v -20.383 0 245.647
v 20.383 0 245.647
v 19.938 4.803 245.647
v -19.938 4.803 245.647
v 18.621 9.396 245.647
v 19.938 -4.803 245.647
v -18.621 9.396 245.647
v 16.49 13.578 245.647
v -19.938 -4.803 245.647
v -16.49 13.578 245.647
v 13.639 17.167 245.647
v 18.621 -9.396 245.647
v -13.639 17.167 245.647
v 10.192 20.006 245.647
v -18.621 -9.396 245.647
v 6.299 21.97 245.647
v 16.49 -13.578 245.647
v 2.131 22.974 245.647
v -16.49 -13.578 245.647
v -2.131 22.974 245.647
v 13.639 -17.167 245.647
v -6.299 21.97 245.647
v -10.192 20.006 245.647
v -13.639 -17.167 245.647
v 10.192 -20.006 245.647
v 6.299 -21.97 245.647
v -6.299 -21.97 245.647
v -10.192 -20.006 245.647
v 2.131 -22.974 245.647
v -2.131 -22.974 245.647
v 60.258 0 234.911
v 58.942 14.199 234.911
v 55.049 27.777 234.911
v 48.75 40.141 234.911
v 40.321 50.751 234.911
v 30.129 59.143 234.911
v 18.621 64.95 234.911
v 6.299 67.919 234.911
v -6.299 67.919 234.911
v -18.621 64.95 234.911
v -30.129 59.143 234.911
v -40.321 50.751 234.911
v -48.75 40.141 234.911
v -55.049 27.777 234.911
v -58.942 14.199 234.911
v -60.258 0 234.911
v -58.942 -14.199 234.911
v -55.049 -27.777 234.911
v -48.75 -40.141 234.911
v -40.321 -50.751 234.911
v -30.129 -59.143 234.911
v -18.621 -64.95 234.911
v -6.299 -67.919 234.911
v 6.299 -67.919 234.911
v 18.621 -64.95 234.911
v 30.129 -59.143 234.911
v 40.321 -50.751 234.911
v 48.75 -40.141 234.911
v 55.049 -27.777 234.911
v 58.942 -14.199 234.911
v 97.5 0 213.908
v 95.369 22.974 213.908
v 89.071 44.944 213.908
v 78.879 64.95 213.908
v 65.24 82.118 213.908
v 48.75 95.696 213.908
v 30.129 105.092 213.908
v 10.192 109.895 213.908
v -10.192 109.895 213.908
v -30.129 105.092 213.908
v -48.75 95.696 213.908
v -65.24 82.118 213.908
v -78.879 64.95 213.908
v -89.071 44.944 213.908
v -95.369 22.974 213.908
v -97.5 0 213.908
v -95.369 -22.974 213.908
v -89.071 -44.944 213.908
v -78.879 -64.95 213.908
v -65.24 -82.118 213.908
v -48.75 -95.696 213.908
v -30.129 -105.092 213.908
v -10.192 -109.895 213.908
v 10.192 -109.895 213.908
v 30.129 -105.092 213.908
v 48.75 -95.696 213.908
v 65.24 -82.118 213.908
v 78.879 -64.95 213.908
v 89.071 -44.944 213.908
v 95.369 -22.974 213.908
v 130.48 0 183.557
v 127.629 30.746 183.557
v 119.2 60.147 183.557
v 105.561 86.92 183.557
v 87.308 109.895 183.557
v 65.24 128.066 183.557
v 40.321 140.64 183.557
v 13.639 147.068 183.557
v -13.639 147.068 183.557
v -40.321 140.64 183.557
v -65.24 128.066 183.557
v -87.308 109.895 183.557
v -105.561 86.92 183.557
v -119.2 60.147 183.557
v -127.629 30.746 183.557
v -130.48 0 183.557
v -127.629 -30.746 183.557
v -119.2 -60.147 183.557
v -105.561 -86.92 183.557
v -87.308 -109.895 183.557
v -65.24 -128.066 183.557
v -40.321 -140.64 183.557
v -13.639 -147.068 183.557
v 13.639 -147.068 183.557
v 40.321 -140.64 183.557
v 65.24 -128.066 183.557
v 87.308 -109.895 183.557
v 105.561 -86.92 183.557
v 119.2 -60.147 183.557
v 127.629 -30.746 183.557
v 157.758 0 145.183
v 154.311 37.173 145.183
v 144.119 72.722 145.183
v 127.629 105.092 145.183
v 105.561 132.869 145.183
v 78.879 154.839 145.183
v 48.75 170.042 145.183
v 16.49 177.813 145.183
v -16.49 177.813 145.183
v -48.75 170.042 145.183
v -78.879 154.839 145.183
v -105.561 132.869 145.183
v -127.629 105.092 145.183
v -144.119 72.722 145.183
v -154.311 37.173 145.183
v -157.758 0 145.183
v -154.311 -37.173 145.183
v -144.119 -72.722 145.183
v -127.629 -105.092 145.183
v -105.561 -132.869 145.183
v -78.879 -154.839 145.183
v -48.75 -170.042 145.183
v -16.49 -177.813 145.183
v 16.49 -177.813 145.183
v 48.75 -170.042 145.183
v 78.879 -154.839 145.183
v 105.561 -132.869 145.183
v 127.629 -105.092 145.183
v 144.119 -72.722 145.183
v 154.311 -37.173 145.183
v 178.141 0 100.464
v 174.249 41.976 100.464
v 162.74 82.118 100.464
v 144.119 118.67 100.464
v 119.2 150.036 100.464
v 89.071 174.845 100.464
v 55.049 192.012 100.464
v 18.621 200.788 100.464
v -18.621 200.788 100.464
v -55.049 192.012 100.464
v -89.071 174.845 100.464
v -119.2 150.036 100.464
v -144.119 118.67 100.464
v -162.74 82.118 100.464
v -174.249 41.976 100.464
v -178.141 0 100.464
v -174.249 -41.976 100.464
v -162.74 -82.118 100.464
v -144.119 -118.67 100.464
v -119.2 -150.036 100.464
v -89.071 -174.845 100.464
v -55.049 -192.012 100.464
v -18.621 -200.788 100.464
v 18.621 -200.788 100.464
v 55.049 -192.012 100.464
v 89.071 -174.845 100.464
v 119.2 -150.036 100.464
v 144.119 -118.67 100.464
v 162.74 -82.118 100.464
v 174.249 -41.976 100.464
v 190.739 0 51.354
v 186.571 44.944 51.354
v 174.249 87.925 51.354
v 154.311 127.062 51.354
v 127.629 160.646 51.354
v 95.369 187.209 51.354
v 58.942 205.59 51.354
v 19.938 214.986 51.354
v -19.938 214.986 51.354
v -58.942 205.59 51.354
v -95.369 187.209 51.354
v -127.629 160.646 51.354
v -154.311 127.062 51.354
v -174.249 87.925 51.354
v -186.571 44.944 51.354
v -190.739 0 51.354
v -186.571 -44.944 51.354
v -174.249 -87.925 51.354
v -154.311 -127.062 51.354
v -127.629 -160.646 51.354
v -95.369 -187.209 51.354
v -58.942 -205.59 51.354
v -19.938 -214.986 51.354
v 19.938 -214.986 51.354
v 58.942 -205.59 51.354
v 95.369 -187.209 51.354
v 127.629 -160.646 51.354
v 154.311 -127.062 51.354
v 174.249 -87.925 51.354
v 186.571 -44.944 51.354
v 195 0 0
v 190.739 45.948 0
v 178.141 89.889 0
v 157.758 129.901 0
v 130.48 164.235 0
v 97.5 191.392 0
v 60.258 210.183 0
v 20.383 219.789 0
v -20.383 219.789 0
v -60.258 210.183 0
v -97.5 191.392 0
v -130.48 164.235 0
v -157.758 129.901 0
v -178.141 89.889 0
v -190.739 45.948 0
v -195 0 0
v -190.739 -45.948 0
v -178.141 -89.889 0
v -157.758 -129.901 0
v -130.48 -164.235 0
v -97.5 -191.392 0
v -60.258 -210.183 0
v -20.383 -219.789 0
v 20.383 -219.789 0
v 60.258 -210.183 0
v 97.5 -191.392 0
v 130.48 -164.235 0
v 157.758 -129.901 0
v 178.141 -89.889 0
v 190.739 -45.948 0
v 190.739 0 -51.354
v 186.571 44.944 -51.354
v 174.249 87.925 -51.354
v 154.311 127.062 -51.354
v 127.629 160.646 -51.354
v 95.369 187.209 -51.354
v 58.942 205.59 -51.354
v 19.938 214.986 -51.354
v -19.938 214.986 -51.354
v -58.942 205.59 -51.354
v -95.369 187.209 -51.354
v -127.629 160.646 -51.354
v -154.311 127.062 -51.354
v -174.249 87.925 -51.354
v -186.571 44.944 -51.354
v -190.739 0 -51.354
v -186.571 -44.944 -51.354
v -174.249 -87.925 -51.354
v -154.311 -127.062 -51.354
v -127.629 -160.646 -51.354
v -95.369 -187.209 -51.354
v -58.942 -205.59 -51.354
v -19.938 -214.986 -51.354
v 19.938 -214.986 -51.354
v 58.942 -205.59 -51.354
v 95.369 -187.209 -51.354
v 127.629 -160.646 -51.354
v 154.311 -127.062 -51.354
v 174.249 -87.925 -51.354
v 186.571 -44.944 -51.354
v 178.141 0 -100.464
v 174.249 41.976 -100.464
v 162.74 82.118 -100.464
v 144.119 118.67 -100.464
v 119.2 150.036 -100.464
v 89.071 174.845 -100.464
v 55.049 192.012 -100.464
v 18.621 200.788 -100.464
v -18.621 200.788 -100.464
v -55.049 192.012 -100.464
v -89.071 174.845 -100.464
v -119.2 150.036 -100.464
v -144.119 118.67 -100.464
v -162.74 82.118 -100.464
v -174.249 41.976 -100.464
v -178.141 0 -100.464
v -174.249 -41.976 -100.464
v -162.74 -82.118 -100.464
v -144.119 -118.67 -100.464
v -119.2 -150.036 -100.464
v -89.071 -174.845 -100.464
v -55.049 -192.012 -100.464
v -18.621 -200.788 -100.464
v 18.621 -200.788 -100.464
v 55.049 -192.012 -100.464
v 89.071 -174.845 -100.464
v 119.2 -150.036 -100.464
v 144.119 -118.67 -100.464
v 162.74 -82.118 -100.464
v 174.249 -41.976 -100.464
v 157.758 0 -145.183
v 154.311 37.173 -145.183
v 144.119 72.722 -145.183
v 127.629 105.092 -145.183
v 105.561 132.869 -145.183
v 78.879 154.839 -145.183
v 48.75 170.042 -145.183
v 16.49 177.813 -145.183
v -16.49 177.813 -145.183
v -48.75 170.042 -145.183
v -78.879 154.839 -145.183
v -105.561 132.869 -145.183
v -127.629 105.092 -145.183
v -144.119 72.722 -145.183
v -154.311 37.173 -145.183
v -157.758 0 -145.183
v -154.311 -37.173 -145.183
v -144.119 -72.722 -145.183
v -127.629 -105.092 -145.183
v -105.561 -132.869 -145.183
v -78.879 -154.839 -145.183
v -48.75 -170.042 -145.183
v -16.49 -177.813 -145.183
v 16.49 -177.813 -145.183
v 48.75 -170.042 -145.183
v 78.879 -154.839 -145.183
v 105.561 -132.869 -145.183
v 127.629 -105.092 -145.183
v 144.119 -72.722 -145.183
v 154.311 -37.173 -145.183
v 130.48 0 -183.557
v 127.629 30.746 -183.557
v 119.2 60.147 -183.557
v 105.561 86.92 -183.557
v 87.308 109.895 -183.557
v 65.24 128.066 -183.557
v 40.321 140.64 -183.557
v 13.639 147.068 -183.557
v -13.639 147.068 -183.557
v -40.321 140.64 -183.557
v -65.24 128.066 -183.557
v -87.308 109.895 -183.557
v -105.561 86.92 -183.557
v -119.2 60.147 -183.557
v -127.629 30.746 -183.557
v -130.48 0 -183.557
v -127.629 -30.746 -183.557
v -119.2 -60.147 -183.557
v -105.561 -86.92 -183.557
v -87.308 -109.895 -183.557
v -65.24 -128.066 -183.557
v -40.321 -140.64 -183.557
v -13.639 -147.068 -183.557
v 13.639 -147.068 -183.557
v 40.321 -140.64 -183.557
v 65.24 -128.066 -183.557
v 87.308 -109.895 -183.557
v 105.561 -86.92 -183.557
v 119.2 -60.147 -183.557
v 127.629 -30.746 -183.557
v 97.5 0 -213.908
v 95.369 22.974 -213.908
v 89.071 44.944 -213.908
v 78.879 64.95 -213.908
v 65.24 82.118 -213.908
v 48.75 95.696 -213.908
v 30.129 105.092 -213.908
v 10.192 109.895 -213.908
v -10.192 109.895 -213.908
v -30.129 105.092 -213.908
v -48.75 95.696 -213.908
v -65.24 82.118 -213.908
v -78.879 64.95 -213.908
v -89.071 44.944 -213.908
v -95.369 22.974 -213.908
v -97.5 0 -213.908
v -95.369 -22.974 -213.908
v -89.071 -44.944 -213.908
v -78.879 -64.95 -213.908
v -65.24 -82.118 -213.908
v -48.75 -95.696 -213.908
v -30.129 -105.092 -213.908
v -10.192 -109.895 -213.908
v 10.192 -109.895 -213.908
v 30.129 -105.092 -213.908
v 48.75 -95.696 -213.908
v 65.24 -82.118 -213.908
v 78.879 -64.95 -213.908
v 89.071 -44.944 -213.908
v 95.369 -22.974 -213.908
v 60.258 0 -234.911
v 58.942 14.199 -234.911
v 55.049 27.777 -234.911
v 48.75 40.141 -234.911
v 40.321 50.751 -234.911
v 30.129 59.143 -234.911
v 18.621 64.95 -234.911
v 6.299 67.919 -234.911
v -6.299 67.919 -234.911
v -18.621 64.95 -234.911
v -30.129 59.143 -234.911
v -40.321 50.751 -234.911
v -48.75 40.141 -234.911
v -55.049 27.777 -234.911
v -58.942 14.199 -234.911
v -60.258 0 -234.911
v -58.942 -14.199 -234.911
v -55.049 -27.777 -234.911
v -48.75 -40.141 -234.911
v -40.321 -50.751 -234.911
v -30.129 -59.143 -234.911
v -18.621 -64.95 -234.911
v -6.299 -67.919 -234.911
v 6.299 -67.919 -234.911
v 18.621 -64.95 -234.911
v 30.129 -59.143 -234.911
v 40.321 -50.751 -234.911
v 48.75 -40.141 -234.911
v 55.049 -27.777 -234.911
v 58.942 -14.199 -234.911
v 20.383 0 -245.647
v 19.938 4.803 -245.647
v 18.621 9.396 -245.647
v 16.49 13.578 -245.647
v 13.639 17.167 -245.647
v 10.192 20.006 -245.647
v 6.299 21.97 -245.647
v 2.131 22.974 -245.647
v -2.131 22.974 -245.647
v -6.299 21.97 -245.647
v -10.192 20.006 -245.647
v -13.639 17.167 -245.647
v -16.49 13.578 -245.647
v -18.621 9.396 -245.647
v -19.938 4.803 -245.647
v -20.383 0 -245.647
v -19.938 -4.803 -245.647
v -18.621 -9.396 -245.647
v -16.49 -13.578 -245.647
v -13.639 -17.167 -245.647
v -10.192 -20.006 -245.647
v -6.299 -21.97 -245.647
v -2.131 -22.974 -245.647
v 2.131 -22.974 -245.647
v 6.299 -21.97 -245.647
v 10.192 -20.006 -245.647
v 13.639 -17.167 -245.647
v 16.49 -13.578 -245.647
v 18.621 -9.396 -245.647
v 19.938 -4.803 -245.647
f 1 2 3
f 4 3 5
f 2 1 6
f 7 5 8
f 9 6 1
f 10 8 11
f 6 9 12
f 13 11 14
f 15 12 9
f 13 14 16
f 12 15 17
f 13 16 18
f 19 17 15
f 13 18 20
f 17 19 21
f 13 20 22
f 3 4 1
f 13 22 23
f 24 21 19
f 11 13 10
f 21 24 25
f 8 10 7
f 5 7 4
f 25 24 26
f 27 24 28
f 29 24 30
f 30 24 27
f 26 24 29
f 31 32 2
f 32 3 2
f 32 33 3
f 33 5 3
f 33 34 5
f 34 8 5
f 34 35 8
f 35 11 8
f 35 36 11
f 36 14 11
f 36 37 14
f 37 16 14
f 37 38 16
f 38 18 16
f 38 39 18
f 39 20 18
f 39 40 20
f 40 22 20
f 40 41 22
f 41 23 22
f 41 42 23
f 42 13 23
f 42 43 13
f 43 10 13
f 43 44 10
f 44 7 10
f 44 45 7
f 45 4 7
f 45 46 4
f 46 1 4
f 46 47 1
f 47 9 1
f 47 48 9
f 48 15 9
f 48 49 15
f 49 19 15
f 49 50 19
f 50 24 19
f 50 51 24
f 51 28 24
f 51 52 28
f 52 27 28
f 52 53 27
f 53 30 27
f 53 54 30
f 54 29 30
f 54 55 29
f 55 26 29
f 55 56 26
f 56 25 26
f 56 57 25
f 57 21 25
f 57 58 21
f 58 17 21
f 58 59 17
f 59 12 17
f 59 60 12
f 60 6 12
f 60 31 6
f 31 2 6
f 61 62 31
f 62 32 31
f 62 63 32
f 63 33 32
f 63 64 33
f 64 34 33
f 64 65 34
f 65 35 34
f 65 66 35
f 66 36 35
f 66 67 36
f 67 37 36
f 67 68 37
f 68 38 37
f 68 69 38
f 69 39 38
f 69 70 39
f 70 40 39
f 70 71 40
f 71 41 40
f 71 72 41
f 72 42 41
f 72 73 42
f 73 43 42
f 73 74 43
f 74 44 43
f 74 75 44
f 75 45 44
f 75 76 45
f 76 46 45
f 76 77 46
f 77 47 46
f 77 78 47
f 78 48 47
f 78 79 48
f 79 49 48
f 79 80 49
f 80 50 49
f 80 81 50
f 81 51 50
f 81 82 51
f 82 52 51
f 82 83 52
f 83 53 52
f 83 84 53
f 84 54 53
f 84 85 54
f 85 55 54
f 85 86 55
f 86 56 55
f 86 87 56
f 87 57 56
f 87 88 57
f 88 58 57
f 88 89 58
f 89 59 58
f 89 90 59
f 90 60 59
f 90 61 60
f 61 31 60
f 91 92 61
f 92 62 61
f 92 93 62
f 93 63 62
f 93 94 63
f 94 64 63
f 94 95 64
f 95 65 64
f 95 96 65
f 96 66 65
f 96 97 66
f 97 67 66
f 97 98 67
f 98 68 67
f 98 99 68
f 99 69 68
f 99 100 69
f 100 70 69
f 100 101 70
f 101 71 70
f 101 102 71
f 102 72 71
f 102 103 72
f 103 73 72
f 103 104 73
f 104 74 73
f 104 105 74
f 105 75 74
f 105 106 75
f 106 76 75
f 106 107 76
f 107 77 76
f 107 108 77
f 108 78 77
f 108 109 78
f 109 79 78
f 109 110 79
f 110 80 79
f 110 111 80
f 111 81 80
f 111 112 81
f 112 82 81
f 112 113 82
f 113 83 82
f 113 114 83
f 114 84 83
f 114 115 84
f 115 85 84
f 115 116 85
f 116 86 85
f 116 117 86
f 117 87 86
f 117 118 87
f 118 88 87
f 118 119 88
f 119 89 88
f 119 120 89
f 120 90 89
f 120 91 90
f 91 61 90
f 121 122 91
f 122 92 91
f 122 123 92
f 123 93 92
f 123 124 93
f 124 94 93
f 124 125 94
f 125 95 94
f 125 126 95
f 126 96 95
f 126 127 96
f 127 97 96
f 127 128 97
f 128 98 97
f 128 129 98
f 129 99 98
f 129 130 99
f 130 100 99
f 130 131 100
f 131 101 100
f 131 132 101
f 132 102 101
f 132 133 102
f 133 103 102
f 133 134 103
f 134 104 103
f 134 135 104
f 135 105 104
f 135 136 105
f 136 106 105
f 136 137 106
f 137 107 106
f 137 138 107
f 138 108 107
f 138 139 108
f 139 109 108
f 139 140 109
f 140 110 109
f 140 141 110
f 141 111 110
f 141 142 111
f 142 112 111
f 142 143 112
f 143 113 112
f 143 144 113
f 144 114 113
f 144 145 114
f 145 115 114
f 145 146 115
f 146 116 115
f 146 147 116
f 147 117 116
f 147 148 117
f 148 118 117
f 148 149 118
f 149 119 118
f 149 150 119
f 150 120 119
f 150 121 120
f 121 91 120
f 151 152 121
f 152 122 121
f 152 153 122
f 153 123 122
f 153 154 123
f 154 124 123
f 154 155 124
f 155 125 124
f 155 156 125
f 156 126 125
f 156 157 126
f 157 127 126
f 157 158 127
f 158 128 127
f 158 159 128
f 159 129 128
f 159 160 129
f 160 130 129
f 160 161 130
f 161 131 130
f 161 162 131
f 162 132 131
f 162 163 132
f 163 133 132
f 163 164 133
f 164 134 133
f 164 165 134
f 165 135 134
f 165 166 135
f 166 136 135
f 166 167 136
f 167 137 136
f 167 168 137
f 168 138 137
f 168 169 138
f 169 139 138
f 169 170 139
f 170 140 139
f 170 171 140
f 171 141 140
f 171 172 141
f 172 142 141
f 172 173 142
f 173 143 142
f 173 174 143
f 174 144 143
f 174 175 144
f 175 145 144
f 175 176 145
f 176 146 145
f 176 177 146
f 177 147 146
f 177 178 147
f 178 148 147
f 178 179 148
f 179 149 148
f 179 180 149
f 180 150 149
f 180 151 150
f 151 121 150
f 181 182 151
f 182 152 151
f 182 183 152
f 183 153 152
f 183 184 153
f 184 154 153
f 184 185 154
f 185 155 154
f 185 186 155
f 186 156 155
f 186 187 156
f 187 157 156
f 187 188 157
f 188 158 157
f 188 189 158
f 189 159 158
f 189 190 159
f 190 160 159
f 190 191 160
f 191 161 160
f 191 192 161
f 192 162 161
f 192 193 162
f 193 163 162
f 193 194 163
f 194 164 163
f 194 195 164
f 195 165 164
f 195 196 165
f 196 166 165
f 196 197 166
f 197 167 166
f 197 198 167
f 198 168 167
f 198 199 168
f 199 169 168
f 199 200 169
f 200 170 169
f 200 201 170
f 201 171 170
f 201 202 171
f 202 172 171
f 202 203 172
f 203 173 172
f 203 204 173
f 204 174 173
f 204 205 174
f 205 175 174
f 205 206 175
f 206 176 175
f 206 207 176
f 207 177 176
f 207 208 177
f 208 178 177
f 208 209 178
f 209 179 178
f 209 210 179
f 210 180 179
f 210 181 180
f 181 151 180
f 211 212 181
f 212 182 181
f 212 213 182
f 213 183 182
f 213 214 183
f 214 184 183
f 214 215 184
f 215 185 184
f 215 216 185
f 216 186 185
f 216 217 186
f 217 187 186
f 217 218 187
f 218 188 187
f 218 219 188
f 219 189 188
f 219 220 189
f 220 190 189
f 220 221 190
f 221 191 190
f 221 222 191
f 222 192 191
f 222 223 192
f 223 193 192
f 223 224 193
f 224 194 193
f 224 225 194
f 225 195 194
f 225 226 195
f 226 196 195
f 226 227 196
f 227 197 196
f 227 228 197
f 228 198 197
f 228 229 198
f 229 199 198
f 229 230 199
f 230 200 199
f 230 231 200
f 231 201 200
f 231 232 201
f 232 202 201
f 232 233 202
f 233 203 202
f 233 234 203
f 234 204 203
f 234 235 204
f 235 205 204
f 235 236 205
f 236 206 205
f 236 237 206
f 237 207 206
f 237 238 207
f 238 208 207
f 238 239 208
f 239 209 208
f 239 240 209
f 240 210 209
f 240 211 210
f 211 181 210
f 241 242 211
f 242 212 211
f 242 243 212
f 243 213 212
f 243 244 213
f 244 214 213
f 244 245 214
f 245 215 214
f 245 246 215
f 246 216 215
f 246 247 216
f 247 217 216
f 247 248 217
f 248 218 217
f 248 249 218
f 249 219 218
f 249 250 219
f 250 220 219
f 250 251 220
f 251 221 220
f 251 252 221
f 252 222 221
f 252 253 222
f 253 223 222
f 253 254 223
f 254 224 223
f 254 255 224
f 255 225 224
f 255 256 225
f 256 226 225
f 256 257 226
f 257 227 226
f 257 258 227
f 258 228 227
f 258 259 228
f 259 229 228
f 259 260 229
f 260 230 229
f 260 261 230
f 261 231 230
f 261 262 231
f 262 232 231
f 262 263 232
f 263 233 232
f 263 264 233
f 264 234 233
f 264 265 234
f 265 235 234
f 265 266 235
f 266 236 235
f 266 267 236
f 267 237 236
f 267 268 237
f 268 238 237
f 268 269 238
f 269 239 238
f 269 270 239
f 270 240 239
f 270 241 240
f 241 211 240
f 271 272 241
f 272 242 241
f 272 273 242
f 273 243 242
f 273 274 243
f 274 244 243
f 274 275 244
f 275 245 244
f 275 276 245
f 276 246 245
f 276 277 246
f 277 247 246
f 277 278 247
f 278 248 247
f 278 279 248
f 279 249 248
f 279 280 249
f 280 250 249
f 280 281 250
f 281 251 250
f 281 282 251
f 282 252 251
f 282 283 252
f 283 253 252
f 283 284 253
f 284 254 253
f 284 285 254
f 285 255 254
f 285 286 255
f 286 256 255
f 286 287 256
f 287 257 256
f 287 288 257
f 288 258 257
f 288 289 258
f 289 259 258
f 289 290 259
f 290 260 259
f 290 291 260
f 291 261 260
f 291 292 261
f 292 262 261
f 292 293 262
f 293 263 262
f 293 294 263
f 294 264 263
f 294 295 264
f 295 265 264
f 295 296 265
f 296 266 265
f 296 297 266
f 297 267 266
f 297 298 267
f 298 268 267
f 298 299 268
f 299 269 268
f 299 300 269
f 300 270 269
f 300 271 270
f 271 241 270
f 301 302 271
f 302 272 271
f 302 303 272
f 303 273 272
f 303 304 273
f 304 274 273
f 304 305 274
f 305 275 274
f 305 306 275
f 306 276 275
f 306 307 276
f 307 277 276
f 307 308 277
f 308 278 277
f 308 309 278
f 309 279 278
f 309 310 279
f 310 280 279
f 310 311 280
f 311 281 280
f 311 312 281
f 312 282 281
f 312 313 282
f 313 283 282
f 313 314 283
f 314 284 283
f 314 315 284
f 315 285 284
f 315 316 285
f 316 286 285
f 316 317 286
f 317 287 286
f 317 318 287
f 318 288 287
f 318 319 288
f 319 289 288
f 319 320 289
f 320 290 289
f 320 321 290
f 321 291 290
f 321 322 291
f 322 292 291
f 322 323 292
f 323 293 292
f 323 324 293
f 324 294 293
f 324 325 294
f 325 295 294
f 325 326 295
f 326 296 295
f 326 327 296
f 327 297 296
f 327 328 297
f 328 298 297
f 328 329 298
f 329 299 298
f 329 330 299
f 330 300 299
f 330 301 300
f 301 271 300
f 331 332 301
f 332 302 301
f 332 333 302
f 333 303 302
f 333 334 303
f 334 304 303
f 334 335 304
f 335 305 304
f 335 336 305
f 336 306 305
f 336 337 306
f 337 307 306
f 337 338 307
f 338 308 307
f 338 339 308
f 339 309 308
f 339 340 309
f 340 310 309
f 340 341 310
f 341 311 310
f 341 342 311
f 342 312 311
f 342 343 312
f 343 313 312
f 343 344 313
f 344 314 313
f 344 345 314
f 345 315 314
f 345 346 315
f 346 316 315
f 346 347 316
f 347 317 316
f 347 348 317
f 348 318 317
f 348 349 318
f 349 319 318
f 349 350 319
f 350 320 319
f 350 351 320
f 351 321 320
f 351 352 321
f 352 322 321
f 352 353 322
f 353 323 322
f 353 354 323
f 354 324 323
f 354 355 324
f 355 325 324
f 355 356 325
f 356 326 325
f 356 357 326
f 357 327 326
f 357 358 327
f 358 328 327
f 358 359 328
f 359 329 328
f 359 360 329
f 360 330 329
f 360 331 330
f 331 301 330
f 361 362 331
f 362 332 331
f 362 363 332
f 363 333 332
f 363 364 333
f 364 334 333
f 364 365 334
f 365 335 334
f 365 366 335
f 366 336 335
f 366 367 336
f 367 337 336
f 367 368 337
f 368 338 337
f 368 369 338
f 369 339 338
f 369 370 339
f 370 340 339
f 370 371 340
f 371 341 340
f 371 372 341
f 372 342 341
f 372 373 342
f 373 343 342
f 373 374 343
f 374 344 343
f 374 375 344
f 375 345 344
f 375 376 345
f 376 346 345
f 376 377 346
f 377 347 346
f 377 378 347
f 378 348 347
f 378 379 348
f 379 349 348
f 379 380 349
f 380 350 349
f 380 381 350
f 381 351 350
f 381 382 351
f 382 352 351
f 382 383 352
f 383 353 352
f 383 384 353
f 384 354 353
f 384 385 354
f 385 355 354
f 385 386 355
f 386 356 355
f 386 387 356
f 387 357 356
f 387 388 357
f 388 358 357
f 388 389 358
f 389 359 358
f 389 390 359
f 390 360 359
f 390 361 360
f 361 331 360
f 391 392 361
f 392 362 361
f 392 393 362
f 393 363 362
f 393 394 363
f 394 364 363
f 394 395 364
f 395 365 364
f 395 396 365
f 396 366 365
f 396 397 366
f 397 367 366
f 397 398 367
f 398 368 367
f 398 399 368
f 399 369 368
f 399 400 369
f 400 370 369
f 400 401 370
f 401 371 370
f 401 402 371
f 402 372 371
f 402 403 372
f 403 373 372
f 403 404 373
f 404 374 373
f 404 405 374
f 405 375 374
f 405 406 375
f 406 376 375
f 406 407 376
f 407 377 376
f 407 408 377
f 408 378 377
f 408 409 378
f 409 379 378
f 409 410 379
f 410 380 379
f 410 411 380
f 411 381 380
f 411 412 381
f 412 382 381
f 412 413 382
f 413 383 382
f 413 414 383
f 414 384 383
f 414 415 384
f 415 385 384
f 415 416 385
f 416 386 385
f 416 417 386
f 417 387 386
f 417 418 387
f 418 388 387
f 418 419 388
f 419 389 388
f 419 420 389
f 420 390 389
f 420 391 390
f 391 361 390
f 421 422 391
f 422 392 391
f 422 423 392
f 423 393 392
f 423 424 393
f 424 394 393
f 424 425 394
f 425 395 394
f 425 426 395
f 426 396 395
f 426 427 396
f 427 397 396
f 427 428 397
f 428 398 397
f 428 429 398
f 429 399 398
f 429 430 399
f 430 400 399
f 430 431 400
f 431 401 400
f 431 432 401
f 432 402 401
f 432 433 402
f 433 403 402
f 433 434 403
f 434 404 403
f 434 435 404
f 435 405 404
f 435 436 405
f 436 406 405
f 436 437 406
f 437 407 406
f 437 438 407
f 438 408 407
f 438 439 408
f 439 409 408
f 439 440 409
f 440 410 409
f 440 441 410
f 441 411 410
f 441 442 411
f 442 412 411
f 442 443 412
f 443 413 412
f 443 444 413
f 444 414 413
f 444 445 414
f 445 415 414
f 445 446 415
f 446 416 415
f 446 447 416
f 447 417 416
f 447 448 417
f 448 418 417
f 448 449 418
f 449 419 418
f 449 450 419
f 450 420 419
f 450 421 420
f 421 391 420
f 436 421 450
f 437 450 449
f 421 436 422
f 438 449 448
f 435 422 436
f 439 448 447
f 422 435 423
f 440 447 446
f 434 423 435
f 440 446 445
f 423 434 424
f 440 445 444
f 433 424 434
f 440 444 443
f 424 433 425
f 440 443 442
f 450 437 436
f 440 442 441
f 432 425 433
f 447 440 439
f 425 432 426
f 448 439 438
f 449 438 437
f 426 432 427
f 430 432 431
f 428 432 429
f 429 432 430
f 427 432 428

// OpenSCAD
// Generated by SolidPython 1.0.1 on 2020-07-29 00:46:52


scale(v = [15, 17, 19]) {
	sphere(r = 13);
}
/***********************************************
*********      SolidPython code:      **********
************************************************
 
# import packages: SolidPython
from solid import *
from solid.utils import *
from itertools import chain, combinations, permutations


class Resize:

    def __init__(self, scad_file):
        self.scad_file = scad_file
        #self.scad_file = import_scad(scad_file)
        # cone/cylinder param:
        self.r1 = 0
        self.r2 = 0
        self.h = 0
        # rectangular prism param:
        self.w = 0
        self.l = 0
        # ellipse param:
        self.r = 0

    # import OpenScad code (file name corresponds to shape)


    # classify shape + parameters
    def assign(self, param1, param2, param3):
        if self.scad_file == 'cone.scad':
            self.r1 = param1
            self.r2 = param2
            self.h = param3
        elif self.scad_file == 'cylinder.scad':
            self.r1 = param1
            self.r2 = param2
            self.h = param3
        elif self.scad_file == 'rectangularPrism.scad':
            self.h = param1
            self.l = param2
            self.w = param3
        else:
            self.r = param1
            self.h = param2

    # resize parameters
    def iterate(self):
        x = range(3, 20, 2)
        i = 1
        if self.scad_file == 'cone.scad':
            tempList = list(permutations(x, 2))
            for temp in tempList:
                param1 = temp[0]
                param2 = temp[1]
                filepath = 'produced_scad_files/' + 'cone' + str(param1) + '_' + str(param2) + '_' + '.scad'
                scad_render_to_file(cylinder(h=param1, r1=param2, r2=0), filepath)

        elif self.scad_file == 'cylinder.scad':
            tempList = list(permutations(x, 3))
            for temp in tempList:
                param1 = temp[0]
                param2 = temp[1]
                filepath = 'produced_scad_files/' + 'cylinder' + str(param1) + '_' + str(param2) + '_' + '.scad'
                scad_render_to_file(cylinder(h=param1, r1=param2, r2=param2), filepath)

        elif self.scad_file == 'rectangularPrism.scad':
            tempList = list(permutations(x, 3))
            for temp in tempList:
                param1 = temp[0]
                param2 = temp[1]
                param3 = temp[2]
                filepath = 'produced_scad_files/' + 'rectangularPrism' + str(param1) + '_' + str(param2) + '_' + str(
                    param3) + '.scad'
                scad_render_to_file(cube(size=(param1, param2, param3)), filepath)

        elif self.scad_file == 'ellipse.scad':
            tempList = list(permutations(x, 4))
            for temp in tempList:
                param1 = temp[0]
                param2 = temp[1]
                param3 = temp[2]
                param4 = temp[3]
                filepath = 'produced_scad_files/' + 'ellipse' + str(param1) + '_' + str(param2) + '_' + str(param3) + '_' + str(param4) + '.scad'
                scad_render_to_file(scale([param1, param2, param3])(sphere(r=param4)), filepath)

    def render_to_scadfile(self):
        scad_render_to_file(scad, 'example.scad') 
 
************************************************/
